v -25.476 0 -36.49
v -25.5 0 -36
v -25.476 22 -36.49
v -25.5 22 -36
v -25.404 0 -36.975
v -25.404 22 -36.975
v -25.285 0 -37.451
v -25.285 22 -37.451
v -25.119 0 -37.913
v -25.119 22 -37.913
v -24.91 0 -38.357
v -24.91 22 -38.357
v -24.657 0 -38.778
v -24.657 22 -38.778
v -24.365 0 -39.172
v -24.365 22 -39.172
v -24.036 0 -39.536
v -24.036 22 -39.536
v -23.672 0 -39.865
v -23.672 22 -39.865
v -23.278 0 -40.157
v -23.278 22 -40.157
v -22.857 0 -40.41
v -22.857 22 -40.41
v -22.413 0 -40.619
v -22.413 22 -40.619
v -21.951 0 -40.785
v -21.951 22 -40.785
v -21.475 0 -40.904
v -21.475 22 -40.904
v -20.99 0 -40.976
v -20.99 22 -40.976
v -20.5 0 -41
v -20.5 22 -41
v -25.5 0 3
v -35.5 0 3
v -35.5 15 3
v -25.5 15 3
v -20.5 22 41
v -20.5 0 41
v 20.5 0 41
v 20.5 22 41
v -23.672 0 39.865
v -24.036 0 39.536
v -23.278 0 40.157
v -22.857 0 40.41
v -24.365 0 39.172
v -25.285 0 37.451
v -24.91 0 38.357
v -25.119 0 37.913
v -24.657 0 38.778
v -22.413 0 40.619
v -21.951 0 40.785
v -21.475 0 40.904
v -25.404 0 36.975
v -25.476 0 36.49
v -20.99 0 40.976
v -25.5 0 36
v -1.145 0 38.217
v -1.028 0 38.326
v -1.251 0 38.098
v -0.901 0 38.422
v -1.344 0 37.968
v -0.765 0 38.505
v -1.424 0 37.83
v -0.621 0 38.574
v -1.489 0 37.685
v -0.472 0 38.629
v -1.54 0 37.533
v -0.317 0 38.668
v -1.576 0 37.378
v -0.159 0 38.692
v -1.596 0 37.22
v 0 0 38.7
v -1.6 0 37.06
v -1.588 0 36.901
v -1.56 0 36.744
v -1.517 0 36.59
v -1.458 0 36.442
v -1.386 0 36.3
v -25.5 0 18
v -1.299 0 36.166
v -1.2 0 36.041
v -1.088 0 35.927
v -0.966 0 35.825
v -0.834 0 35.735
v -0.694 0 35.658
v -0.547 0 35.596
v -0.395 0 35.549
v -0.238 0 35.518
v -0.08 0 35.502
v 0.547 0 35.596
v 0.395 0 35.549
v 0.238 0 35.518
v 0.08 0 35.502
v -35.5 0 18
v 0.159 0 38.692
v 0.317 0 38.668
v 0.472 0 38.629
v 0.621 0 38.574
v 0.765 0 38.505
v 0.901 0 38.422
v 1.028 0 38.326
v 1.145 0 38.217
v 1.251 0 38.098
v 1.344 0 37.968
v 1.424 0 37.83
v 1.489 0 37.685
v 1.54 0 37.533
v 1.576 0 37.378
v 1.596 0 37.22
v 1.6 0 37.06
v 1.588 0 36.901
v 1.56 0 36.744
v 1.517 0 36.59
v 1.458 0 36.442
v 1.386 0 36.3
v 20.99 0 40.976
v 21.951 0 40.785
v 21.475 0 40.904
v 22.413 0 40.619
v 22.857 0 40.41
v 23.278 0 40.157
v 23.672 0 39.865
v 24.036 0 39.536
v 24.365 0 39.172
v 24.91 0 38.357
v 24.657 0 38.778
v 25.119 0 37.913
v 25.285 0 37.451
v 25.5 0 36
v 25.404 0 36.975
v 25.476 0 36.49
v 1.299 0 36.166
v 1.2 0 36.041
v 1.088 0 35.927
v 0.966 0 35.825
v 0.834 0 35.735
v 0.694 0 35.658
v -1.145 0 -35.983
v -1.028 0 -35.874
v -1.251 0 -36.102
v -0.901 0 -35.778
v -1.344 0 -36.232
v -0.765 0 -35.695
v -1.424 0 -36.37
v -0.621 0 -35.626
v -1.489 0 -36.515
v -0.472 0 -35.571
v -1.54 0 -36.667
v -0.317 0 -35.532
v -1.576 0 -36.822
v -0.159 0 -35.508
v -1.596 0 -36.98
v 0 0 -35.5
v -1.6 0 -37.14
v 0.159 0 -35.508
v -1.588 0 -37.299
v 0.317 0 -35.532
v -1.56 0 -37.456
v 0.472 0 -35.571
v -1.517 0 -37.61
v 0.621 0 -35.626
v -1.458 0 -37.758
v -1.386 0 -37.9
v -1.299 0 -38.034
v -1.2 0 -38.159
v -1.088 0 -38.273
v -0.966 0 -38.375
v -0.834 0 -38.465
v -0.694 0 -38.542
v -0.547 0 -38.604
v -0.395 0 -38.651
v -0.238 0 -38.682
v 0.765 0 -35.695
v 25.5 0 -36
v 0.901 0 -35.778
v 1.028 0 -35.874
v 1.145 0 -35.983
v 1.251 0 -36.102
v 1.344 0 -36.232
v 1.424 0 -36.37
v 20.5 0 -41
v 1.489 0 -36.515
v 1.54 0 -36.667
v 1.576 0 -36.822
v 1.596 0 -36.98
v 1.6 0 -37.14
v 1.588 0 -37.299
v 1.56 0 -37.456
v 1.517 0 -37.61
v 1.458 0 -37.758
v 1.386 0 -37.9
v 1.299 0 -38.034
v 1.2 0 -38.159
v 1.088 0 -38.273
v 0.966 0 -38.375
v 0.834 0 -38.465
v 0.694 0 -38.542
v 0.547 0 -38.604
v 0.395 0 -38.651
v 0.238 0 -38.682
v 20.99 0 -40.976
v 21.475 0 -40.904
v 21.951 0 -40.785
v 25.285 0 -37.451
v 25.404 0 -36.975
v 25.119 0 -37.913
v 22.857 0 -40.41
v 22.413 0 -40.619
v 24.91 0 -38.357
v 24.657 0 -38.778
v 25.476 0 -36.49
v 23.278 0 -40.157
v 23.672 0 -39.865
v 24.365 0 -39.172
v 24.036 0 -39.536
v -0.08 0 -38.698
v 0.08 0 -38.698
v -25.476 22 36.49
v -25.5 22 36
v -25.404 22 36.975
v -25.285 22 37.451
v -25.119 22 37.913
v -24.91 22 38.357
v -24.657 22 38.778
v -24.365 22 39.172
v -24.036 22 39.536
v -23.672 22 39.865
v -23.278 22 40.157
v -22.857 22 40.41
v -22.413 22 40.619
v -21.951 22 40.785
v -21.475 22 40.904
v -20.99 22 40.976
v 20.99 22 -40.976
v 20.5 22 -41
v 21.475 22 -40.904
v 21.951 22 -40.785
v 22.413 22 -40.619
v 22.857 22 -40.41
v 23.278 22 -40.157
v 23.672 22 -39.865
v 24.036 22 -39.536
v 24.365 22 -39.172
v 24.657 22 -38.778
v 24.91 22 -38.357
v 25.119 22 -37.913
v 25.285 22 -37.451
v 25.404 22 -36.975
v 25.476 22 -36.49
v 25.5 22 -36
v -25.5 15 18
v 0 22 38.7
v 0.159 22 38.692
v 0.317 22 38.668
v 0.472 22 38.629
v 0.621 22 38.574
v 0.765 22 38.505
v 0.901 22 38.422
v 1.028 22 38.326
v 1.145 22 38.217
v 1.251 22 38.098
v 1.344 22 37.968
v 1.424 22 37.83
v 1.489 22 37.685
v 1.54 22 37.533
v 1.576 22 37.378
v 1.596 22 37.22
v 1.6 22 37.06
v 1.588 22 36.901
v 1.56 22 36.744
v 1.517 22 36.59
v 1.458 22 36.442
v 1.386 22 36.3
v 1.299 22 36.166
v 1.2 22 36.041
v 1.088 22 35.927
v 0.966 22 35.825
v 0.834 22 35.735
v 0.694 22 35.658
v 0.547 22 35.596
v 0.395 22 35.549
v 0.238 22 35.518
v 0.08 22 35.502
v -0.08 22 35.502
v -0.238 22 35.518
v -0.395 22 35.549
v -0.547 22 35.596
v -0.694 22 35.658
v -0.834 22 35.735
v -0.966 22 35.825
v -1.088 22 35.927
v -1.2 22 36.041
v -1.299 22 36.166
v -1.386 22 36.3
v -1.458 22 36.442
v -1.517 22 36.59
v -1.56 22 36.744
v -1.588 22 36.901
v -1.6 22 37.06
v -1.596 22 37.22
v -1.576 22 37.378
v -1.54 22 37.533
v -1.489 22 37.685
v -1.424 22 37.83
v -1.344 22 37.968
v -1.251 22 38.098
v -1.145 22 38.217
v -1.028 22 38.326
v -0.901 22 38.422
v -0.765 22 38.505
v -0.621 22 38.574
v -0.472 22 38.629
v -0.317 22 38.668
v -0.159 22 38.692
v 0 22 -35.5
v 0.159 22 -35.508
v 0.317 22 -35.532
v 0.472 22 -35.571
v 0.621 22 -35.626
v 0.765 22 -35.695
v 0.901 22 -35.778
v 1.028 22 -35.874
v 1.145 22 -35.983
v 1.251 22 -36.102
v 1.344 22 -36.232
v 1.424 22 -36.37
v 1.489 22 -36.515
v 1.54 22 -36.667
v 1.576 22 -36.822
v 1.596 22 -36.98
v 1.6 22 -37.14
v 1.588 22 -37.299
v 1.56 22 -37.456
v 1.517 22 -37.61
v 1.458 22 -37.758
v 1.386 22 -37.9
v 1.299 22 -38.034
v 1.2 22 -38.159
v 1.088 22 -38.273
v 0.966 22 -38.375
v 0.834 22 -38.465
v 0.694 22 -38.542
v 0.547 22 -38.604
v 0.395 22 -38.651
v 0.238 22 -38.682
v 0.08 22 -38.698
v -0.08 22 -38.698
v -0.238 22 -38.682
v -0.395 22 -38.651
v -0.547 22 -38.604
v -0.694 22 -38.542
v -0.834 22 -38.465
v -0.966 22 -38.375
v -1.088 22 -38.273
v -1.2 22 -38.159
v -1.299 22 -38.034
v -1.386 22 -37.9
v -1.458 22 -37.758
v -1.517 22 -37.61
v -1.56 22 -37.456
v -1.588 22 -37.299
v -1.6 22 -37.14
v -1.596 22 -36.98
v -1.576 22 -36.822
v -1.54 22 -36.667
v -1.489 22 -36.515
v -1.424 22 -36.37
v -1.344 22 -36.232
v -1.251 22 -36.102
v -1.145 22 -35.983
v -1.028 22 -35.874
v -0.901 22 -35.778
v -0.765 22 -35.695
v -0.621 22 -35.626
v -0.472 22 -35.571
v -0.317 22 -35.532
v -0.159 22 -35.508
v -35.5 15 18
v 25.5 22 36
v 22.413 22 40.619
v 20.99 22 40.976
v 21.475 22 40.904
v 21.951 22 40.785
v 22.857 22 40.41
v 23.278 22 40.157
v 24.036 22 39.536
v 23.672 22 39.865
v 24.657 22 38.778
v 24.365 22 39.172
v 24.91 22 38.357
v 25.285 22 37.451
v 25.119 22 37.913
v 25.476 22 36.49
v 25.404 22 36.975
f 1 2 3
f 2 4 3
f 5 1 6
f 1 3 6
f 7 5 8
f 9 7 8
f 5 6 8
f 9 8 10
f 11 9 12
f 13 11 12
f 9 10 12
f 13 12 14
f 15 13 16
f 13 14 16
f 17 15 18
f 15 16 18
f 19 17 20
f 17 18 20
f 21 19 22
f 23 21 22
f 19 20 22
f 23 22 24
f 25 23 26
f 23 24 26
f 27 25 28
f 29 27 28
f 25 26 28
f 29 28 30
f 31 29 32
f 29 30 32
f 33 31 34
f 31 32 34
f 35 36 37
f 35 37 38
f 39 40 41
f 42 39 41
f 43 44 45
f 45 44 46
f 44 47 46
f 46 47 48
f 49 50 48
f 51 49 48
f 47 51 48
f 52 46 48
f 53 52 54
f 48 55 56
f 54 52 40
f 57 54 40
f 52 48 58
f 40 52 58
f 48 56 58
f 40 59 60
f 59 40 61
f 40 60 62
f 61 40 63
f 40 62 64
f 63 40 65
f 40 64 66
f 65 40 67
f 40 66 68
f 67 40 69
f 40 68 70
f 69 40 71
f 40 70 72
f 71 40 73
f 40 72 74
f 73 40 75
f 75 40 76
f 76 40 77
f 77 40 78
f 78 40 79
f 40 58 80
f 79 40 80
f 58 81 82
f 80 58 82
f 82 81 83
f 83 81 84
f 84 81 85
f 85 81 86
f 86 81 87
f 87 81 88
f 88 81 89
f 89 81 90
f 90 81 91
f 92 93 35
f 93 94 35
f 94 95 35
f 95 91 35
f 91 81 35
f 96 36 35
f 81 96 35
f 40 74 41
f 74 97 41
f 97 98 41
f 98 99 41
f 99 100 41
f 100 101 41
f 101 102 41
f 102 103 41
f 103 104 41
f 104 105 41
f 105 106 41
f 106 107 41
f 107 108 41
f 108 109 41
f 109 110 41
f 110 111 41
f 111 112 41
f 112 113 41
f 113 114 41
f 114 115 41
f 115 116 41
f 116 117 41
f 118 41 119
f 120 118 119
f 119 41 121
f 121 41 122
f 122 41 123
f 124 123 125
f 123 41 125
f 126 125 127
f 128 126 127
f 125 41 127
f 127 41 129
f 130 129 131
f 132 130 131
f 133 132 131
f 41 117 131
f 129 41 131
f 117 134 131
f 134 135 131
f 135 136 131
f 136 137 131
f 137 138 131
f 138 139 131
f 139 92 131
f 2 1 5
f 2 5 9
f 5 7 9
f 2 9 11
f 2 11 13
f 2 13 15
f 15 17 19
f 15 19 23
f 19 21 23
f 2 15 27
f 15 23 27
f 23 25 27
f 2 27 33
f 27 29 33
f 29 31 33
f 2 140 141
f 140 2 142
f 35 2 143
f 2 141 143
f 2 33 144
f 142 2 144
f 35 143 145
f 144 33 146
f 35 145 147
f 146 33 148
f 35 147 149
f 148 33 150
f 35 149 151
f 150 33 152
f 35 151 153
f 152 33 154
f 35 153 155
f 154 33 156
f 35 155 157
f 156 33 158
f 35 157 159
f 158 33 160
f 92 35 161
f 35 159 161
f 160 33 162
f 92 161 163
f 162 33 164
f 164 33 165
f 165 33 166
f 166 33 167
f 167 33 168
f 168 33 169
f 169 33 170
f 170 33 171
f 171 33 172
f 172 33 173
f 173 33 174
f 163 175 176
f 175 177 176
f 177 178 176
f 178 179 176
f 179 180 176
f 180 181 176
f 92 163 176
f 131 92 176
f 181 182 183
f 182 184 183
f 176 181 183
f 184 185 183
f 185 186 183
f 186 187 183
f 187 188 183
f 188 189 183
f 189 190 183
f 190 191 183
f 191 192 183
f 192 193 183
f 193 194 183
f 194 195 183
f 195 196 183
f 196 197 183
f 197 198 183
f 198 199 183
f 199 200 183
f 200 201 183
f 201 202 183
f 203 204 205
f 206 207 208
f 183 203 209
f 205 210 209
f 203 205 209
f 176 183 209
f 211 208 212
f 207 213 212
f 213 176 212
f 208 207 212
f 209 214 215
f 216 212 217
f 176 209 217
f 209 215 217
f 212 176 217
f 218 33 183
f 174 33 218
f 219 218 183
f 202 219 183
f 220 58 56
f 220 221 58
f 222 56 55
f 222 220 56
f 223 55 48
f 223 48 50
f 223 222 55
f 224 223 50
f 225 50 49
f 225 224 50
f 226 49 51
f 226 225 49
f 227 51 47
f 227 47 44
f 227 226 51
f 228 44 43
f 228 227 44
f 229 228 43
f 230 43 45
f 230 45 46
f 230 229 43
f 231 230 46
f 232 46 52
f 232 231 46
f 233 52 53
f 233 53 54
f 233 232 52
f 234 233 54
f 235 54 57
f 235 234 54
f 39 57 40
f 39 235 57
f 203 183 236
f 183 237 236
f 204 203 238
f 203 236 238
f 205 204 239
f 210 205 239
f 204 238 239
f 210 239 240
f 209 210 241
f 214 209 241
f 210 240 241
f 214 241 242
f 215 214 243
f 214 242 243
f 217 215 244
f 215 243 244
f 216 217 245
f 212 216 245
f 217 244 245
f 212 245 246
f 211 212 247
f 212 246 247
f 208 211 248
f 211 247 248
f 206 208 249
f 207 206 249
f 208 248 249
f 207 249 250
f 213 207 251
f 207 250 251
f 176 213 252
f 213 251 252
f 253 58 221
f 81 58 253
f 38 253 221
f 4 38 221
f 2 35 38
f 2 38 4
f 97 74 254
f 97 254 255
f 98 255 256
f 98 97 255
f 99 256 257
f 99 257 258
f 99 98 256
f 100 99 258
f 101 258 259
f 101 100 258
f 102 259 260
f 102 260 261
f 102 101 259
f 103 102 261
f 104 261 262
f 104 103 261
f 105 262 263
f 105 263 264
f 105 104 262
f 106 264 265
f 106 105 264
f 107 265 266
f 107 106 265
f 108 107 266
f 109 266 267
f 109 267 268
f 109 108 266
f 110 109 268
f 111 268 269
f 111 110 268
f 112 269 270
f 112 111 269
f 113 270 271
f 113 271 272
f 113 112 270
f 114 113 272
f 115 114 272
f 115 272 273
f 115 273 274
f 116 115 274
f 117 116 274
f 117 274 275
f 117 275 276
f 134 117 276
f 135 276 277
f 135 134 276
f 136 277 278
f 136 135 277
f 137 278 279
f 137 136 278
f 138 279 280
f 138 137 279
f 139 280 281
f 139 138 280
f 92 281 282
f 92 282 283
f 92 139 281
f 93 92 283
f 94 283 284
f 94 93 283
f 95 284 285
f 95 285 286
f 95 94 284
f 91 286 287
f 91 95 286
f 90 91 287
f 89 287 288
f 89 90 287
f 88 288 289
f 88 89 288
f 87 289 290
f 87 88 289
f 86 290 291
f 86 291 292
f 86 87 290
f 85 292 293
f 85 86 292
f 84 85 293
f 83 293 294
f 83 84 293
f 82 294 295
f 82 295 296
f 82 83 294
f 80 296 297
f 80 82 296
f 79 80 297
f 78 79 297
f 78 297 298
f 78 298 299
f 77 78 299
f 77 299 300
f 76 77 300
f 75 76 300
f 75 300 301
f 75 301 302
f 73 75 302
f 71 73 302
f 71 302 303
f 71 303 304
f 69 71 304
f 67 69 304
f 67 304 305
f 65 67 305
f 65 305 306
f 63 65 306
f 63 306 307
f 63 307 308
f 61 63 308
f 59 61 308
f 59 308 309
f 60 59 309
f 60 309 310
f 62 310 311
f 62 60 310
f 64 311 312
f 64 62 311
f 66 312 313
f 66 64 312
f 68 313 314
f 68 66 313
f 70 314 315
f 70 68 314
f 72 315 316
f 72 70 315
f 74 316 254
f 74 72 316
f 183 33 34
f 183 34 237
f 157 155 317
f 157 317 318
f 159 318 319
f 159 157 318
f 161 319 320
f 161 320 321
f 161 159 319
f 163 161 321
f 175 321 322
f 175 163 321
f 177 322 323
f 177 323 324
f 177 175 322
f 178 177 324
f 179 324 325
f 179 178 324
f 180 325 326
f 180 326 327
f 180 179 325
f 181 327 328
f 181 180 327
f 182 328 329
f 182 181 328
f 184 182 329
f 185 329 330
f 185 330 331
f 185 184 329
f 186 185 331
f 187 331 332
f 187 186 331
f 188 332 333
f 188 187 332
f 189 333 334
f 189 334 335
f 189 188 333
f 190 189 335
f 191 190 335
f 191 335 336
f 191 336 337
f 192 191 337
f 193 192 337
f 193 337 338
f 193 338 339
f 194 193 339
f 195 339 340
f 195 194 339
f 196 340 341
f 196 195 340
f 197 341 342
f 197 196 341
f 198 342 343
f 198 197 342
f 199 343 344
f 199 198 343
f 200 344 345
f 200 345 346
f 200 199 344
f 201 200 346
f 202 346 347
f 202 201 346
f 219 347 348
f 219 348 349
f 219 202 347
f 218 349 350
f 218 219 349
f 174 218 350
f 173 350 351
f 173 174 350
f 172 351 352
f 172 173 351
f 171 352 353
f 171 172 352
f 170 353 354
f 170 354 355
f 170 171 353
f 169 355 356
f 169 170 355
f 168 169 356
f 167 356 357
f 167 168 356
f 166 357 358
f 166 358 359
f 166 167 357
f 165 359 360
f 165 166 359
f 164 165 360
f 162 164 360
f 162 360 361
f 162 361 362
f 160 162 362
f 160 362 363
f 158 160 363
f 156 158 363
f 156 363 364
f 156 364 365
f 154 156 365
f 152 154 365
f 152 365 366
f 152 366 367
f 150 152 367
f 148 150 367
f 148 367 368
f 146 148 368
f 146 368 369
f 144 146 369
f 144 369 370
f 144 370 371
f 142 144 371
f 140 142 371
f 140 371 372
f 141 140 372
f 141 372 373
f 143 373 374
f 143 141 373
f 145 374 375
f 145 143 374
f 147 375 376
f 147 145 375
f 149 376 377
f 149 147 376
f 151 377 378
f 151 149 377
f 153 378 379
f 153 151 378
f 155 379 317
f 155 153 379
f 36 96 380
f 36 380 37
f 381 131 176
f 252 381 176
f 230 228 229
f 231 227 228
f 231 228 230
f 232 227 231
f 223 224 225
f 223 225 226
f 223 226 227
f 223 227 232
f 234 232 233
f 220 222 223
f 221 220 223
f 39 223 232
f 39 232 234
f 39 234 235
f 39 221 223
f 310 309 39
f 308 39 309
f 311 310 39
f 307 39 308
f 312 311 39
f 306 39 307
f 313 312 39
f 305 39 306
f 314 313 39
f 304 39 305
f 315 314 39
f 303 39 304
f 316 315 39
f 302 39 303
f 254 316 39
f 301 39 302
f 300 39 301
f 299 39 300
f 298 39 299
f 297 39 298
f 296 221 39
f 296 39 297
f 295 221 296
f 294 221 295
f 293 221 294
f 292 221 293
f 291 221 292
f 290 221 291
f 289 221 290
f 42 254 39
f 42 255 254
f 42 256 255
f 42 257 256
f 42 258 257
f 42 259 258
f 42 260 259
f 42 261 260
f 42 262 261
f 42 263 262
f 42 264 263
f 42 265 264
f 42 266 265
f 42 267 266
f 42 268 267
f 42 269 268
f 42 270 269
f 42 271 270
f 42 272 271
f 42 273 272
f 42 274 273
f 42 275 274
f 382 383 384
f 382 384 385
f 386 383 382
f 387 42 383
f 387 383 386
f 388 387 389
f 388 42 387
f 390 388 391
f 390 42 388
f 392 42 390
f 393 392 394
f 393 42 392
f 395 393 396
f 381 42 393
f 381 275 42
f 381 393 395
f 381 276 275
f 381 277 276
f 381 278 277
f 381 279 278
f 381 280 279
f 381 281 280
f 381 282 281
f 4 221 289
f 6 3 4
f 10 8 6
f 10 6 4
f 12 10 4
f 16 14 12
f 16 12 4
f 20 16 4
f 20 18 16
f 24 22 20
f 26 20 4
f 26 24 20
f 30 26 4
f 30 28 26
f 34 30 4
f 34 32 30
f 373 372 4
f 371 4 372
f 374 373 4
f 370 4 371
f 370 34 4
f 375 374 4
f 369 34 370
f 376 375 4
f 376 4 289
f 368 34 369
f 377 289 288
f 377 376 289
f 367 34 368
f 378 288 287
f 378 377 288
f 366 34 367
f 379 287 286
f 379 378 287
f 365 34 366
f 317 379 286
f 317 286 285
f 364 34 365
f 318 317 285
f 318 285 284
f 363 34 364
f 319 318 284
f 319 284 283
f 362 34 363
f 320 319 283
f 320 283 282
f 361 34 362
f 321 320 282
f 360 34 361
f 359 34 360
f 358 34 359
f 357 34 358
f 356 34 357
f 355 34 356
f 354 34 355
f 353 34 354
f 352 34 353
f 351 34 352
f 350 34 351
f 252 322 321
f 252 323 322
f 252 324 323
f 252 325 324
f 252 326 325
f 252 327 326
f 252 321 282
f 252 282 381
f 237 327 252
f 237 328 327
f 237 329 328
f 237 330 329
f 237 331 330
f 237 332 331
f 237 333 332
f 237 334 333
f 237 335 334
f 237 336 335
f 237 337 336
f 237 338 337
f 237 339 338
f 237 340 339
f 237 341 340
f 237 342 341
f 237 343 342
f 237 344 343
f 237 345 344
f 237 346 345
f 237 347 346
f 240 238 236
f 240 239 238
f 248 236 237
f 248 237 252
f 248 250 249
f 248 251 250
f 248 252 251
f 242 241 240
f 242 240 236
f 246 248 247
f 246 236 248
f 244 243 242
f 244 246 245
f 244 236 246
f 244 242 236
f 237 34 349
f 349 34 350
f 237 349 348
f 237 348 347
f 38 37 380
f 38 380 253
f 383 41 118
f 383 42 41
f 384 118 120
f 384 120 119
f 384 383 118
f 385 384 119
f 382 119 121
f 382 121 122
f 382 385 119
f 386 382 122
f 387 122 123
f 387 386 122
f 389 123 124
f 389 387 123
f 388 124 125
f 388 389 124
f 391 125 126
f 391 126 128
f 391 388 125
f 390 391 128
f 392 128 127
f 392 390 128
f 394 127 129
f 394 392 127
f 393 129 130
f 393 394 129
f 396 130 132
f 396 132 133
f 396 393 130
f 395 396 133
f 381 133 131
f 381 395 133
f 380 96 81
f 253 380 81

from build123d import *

# Parameters (mm, degrees)
SKETCH1_R           = 1.6
BOSS_EXTRUDE1_DEPTH = 22
SKETCH1_3_W         = 10
SKETCH1_3_H         = 15
BOSS_EXTRUDE2_DEPTH = 15
FILLET1_R           = 5


with BuildPart() as part:
    # Sketch1 → Boss-Extrude1 (new body)
    with BuildSketch(Plane(origin=(0, 0, 0), x_dir=(1, 0, 0), z_dir=(0, 1, 0))):
        Polygon((-25.5, -18), (-25.5, -41), (25.5, -41), (25.5, -25.5), (25.5, -17), (25.5, 41), (-25.5, 41), (-25.5, -3), align=None)
        with Locations((0, -37.1)):
            Circle(SKETCH1_R, mode=Mode.SUBTRACT)
        with Locations((0, 37.1)):
            Circle(SKETCH1_R, mode=Mode.SUBTRACT)
    extrude(amount=BOSS_EXTRUDE1_DEPTH)

    # Sketch1<3> → Boss-Extrude2 (add)
    with BuildSketch(Plane(origin=(0, 0, 0), x_dir=(1, 0, 0), z_dir=(0, 1, 0))):
        with Locations((-30.5, -10.5)):
            Rectangle(SKETCH1_3_W, SKETCH1_3_H)
    extrude(amount=BOSS_EXTRUDE2_DEPTH)

    # Fillet1
    fillet1_edges = [part.edges().sort_by_distance(p)[0] for p in [
        (-25.5, 11, -41),
        (25.5, 11, -41),
        (25.5, 11, 41),
        (-25.5, 11, 41),
    ]]
    fillet(fillet1_edges, radius=FILLET1_R)


solid = part.part
